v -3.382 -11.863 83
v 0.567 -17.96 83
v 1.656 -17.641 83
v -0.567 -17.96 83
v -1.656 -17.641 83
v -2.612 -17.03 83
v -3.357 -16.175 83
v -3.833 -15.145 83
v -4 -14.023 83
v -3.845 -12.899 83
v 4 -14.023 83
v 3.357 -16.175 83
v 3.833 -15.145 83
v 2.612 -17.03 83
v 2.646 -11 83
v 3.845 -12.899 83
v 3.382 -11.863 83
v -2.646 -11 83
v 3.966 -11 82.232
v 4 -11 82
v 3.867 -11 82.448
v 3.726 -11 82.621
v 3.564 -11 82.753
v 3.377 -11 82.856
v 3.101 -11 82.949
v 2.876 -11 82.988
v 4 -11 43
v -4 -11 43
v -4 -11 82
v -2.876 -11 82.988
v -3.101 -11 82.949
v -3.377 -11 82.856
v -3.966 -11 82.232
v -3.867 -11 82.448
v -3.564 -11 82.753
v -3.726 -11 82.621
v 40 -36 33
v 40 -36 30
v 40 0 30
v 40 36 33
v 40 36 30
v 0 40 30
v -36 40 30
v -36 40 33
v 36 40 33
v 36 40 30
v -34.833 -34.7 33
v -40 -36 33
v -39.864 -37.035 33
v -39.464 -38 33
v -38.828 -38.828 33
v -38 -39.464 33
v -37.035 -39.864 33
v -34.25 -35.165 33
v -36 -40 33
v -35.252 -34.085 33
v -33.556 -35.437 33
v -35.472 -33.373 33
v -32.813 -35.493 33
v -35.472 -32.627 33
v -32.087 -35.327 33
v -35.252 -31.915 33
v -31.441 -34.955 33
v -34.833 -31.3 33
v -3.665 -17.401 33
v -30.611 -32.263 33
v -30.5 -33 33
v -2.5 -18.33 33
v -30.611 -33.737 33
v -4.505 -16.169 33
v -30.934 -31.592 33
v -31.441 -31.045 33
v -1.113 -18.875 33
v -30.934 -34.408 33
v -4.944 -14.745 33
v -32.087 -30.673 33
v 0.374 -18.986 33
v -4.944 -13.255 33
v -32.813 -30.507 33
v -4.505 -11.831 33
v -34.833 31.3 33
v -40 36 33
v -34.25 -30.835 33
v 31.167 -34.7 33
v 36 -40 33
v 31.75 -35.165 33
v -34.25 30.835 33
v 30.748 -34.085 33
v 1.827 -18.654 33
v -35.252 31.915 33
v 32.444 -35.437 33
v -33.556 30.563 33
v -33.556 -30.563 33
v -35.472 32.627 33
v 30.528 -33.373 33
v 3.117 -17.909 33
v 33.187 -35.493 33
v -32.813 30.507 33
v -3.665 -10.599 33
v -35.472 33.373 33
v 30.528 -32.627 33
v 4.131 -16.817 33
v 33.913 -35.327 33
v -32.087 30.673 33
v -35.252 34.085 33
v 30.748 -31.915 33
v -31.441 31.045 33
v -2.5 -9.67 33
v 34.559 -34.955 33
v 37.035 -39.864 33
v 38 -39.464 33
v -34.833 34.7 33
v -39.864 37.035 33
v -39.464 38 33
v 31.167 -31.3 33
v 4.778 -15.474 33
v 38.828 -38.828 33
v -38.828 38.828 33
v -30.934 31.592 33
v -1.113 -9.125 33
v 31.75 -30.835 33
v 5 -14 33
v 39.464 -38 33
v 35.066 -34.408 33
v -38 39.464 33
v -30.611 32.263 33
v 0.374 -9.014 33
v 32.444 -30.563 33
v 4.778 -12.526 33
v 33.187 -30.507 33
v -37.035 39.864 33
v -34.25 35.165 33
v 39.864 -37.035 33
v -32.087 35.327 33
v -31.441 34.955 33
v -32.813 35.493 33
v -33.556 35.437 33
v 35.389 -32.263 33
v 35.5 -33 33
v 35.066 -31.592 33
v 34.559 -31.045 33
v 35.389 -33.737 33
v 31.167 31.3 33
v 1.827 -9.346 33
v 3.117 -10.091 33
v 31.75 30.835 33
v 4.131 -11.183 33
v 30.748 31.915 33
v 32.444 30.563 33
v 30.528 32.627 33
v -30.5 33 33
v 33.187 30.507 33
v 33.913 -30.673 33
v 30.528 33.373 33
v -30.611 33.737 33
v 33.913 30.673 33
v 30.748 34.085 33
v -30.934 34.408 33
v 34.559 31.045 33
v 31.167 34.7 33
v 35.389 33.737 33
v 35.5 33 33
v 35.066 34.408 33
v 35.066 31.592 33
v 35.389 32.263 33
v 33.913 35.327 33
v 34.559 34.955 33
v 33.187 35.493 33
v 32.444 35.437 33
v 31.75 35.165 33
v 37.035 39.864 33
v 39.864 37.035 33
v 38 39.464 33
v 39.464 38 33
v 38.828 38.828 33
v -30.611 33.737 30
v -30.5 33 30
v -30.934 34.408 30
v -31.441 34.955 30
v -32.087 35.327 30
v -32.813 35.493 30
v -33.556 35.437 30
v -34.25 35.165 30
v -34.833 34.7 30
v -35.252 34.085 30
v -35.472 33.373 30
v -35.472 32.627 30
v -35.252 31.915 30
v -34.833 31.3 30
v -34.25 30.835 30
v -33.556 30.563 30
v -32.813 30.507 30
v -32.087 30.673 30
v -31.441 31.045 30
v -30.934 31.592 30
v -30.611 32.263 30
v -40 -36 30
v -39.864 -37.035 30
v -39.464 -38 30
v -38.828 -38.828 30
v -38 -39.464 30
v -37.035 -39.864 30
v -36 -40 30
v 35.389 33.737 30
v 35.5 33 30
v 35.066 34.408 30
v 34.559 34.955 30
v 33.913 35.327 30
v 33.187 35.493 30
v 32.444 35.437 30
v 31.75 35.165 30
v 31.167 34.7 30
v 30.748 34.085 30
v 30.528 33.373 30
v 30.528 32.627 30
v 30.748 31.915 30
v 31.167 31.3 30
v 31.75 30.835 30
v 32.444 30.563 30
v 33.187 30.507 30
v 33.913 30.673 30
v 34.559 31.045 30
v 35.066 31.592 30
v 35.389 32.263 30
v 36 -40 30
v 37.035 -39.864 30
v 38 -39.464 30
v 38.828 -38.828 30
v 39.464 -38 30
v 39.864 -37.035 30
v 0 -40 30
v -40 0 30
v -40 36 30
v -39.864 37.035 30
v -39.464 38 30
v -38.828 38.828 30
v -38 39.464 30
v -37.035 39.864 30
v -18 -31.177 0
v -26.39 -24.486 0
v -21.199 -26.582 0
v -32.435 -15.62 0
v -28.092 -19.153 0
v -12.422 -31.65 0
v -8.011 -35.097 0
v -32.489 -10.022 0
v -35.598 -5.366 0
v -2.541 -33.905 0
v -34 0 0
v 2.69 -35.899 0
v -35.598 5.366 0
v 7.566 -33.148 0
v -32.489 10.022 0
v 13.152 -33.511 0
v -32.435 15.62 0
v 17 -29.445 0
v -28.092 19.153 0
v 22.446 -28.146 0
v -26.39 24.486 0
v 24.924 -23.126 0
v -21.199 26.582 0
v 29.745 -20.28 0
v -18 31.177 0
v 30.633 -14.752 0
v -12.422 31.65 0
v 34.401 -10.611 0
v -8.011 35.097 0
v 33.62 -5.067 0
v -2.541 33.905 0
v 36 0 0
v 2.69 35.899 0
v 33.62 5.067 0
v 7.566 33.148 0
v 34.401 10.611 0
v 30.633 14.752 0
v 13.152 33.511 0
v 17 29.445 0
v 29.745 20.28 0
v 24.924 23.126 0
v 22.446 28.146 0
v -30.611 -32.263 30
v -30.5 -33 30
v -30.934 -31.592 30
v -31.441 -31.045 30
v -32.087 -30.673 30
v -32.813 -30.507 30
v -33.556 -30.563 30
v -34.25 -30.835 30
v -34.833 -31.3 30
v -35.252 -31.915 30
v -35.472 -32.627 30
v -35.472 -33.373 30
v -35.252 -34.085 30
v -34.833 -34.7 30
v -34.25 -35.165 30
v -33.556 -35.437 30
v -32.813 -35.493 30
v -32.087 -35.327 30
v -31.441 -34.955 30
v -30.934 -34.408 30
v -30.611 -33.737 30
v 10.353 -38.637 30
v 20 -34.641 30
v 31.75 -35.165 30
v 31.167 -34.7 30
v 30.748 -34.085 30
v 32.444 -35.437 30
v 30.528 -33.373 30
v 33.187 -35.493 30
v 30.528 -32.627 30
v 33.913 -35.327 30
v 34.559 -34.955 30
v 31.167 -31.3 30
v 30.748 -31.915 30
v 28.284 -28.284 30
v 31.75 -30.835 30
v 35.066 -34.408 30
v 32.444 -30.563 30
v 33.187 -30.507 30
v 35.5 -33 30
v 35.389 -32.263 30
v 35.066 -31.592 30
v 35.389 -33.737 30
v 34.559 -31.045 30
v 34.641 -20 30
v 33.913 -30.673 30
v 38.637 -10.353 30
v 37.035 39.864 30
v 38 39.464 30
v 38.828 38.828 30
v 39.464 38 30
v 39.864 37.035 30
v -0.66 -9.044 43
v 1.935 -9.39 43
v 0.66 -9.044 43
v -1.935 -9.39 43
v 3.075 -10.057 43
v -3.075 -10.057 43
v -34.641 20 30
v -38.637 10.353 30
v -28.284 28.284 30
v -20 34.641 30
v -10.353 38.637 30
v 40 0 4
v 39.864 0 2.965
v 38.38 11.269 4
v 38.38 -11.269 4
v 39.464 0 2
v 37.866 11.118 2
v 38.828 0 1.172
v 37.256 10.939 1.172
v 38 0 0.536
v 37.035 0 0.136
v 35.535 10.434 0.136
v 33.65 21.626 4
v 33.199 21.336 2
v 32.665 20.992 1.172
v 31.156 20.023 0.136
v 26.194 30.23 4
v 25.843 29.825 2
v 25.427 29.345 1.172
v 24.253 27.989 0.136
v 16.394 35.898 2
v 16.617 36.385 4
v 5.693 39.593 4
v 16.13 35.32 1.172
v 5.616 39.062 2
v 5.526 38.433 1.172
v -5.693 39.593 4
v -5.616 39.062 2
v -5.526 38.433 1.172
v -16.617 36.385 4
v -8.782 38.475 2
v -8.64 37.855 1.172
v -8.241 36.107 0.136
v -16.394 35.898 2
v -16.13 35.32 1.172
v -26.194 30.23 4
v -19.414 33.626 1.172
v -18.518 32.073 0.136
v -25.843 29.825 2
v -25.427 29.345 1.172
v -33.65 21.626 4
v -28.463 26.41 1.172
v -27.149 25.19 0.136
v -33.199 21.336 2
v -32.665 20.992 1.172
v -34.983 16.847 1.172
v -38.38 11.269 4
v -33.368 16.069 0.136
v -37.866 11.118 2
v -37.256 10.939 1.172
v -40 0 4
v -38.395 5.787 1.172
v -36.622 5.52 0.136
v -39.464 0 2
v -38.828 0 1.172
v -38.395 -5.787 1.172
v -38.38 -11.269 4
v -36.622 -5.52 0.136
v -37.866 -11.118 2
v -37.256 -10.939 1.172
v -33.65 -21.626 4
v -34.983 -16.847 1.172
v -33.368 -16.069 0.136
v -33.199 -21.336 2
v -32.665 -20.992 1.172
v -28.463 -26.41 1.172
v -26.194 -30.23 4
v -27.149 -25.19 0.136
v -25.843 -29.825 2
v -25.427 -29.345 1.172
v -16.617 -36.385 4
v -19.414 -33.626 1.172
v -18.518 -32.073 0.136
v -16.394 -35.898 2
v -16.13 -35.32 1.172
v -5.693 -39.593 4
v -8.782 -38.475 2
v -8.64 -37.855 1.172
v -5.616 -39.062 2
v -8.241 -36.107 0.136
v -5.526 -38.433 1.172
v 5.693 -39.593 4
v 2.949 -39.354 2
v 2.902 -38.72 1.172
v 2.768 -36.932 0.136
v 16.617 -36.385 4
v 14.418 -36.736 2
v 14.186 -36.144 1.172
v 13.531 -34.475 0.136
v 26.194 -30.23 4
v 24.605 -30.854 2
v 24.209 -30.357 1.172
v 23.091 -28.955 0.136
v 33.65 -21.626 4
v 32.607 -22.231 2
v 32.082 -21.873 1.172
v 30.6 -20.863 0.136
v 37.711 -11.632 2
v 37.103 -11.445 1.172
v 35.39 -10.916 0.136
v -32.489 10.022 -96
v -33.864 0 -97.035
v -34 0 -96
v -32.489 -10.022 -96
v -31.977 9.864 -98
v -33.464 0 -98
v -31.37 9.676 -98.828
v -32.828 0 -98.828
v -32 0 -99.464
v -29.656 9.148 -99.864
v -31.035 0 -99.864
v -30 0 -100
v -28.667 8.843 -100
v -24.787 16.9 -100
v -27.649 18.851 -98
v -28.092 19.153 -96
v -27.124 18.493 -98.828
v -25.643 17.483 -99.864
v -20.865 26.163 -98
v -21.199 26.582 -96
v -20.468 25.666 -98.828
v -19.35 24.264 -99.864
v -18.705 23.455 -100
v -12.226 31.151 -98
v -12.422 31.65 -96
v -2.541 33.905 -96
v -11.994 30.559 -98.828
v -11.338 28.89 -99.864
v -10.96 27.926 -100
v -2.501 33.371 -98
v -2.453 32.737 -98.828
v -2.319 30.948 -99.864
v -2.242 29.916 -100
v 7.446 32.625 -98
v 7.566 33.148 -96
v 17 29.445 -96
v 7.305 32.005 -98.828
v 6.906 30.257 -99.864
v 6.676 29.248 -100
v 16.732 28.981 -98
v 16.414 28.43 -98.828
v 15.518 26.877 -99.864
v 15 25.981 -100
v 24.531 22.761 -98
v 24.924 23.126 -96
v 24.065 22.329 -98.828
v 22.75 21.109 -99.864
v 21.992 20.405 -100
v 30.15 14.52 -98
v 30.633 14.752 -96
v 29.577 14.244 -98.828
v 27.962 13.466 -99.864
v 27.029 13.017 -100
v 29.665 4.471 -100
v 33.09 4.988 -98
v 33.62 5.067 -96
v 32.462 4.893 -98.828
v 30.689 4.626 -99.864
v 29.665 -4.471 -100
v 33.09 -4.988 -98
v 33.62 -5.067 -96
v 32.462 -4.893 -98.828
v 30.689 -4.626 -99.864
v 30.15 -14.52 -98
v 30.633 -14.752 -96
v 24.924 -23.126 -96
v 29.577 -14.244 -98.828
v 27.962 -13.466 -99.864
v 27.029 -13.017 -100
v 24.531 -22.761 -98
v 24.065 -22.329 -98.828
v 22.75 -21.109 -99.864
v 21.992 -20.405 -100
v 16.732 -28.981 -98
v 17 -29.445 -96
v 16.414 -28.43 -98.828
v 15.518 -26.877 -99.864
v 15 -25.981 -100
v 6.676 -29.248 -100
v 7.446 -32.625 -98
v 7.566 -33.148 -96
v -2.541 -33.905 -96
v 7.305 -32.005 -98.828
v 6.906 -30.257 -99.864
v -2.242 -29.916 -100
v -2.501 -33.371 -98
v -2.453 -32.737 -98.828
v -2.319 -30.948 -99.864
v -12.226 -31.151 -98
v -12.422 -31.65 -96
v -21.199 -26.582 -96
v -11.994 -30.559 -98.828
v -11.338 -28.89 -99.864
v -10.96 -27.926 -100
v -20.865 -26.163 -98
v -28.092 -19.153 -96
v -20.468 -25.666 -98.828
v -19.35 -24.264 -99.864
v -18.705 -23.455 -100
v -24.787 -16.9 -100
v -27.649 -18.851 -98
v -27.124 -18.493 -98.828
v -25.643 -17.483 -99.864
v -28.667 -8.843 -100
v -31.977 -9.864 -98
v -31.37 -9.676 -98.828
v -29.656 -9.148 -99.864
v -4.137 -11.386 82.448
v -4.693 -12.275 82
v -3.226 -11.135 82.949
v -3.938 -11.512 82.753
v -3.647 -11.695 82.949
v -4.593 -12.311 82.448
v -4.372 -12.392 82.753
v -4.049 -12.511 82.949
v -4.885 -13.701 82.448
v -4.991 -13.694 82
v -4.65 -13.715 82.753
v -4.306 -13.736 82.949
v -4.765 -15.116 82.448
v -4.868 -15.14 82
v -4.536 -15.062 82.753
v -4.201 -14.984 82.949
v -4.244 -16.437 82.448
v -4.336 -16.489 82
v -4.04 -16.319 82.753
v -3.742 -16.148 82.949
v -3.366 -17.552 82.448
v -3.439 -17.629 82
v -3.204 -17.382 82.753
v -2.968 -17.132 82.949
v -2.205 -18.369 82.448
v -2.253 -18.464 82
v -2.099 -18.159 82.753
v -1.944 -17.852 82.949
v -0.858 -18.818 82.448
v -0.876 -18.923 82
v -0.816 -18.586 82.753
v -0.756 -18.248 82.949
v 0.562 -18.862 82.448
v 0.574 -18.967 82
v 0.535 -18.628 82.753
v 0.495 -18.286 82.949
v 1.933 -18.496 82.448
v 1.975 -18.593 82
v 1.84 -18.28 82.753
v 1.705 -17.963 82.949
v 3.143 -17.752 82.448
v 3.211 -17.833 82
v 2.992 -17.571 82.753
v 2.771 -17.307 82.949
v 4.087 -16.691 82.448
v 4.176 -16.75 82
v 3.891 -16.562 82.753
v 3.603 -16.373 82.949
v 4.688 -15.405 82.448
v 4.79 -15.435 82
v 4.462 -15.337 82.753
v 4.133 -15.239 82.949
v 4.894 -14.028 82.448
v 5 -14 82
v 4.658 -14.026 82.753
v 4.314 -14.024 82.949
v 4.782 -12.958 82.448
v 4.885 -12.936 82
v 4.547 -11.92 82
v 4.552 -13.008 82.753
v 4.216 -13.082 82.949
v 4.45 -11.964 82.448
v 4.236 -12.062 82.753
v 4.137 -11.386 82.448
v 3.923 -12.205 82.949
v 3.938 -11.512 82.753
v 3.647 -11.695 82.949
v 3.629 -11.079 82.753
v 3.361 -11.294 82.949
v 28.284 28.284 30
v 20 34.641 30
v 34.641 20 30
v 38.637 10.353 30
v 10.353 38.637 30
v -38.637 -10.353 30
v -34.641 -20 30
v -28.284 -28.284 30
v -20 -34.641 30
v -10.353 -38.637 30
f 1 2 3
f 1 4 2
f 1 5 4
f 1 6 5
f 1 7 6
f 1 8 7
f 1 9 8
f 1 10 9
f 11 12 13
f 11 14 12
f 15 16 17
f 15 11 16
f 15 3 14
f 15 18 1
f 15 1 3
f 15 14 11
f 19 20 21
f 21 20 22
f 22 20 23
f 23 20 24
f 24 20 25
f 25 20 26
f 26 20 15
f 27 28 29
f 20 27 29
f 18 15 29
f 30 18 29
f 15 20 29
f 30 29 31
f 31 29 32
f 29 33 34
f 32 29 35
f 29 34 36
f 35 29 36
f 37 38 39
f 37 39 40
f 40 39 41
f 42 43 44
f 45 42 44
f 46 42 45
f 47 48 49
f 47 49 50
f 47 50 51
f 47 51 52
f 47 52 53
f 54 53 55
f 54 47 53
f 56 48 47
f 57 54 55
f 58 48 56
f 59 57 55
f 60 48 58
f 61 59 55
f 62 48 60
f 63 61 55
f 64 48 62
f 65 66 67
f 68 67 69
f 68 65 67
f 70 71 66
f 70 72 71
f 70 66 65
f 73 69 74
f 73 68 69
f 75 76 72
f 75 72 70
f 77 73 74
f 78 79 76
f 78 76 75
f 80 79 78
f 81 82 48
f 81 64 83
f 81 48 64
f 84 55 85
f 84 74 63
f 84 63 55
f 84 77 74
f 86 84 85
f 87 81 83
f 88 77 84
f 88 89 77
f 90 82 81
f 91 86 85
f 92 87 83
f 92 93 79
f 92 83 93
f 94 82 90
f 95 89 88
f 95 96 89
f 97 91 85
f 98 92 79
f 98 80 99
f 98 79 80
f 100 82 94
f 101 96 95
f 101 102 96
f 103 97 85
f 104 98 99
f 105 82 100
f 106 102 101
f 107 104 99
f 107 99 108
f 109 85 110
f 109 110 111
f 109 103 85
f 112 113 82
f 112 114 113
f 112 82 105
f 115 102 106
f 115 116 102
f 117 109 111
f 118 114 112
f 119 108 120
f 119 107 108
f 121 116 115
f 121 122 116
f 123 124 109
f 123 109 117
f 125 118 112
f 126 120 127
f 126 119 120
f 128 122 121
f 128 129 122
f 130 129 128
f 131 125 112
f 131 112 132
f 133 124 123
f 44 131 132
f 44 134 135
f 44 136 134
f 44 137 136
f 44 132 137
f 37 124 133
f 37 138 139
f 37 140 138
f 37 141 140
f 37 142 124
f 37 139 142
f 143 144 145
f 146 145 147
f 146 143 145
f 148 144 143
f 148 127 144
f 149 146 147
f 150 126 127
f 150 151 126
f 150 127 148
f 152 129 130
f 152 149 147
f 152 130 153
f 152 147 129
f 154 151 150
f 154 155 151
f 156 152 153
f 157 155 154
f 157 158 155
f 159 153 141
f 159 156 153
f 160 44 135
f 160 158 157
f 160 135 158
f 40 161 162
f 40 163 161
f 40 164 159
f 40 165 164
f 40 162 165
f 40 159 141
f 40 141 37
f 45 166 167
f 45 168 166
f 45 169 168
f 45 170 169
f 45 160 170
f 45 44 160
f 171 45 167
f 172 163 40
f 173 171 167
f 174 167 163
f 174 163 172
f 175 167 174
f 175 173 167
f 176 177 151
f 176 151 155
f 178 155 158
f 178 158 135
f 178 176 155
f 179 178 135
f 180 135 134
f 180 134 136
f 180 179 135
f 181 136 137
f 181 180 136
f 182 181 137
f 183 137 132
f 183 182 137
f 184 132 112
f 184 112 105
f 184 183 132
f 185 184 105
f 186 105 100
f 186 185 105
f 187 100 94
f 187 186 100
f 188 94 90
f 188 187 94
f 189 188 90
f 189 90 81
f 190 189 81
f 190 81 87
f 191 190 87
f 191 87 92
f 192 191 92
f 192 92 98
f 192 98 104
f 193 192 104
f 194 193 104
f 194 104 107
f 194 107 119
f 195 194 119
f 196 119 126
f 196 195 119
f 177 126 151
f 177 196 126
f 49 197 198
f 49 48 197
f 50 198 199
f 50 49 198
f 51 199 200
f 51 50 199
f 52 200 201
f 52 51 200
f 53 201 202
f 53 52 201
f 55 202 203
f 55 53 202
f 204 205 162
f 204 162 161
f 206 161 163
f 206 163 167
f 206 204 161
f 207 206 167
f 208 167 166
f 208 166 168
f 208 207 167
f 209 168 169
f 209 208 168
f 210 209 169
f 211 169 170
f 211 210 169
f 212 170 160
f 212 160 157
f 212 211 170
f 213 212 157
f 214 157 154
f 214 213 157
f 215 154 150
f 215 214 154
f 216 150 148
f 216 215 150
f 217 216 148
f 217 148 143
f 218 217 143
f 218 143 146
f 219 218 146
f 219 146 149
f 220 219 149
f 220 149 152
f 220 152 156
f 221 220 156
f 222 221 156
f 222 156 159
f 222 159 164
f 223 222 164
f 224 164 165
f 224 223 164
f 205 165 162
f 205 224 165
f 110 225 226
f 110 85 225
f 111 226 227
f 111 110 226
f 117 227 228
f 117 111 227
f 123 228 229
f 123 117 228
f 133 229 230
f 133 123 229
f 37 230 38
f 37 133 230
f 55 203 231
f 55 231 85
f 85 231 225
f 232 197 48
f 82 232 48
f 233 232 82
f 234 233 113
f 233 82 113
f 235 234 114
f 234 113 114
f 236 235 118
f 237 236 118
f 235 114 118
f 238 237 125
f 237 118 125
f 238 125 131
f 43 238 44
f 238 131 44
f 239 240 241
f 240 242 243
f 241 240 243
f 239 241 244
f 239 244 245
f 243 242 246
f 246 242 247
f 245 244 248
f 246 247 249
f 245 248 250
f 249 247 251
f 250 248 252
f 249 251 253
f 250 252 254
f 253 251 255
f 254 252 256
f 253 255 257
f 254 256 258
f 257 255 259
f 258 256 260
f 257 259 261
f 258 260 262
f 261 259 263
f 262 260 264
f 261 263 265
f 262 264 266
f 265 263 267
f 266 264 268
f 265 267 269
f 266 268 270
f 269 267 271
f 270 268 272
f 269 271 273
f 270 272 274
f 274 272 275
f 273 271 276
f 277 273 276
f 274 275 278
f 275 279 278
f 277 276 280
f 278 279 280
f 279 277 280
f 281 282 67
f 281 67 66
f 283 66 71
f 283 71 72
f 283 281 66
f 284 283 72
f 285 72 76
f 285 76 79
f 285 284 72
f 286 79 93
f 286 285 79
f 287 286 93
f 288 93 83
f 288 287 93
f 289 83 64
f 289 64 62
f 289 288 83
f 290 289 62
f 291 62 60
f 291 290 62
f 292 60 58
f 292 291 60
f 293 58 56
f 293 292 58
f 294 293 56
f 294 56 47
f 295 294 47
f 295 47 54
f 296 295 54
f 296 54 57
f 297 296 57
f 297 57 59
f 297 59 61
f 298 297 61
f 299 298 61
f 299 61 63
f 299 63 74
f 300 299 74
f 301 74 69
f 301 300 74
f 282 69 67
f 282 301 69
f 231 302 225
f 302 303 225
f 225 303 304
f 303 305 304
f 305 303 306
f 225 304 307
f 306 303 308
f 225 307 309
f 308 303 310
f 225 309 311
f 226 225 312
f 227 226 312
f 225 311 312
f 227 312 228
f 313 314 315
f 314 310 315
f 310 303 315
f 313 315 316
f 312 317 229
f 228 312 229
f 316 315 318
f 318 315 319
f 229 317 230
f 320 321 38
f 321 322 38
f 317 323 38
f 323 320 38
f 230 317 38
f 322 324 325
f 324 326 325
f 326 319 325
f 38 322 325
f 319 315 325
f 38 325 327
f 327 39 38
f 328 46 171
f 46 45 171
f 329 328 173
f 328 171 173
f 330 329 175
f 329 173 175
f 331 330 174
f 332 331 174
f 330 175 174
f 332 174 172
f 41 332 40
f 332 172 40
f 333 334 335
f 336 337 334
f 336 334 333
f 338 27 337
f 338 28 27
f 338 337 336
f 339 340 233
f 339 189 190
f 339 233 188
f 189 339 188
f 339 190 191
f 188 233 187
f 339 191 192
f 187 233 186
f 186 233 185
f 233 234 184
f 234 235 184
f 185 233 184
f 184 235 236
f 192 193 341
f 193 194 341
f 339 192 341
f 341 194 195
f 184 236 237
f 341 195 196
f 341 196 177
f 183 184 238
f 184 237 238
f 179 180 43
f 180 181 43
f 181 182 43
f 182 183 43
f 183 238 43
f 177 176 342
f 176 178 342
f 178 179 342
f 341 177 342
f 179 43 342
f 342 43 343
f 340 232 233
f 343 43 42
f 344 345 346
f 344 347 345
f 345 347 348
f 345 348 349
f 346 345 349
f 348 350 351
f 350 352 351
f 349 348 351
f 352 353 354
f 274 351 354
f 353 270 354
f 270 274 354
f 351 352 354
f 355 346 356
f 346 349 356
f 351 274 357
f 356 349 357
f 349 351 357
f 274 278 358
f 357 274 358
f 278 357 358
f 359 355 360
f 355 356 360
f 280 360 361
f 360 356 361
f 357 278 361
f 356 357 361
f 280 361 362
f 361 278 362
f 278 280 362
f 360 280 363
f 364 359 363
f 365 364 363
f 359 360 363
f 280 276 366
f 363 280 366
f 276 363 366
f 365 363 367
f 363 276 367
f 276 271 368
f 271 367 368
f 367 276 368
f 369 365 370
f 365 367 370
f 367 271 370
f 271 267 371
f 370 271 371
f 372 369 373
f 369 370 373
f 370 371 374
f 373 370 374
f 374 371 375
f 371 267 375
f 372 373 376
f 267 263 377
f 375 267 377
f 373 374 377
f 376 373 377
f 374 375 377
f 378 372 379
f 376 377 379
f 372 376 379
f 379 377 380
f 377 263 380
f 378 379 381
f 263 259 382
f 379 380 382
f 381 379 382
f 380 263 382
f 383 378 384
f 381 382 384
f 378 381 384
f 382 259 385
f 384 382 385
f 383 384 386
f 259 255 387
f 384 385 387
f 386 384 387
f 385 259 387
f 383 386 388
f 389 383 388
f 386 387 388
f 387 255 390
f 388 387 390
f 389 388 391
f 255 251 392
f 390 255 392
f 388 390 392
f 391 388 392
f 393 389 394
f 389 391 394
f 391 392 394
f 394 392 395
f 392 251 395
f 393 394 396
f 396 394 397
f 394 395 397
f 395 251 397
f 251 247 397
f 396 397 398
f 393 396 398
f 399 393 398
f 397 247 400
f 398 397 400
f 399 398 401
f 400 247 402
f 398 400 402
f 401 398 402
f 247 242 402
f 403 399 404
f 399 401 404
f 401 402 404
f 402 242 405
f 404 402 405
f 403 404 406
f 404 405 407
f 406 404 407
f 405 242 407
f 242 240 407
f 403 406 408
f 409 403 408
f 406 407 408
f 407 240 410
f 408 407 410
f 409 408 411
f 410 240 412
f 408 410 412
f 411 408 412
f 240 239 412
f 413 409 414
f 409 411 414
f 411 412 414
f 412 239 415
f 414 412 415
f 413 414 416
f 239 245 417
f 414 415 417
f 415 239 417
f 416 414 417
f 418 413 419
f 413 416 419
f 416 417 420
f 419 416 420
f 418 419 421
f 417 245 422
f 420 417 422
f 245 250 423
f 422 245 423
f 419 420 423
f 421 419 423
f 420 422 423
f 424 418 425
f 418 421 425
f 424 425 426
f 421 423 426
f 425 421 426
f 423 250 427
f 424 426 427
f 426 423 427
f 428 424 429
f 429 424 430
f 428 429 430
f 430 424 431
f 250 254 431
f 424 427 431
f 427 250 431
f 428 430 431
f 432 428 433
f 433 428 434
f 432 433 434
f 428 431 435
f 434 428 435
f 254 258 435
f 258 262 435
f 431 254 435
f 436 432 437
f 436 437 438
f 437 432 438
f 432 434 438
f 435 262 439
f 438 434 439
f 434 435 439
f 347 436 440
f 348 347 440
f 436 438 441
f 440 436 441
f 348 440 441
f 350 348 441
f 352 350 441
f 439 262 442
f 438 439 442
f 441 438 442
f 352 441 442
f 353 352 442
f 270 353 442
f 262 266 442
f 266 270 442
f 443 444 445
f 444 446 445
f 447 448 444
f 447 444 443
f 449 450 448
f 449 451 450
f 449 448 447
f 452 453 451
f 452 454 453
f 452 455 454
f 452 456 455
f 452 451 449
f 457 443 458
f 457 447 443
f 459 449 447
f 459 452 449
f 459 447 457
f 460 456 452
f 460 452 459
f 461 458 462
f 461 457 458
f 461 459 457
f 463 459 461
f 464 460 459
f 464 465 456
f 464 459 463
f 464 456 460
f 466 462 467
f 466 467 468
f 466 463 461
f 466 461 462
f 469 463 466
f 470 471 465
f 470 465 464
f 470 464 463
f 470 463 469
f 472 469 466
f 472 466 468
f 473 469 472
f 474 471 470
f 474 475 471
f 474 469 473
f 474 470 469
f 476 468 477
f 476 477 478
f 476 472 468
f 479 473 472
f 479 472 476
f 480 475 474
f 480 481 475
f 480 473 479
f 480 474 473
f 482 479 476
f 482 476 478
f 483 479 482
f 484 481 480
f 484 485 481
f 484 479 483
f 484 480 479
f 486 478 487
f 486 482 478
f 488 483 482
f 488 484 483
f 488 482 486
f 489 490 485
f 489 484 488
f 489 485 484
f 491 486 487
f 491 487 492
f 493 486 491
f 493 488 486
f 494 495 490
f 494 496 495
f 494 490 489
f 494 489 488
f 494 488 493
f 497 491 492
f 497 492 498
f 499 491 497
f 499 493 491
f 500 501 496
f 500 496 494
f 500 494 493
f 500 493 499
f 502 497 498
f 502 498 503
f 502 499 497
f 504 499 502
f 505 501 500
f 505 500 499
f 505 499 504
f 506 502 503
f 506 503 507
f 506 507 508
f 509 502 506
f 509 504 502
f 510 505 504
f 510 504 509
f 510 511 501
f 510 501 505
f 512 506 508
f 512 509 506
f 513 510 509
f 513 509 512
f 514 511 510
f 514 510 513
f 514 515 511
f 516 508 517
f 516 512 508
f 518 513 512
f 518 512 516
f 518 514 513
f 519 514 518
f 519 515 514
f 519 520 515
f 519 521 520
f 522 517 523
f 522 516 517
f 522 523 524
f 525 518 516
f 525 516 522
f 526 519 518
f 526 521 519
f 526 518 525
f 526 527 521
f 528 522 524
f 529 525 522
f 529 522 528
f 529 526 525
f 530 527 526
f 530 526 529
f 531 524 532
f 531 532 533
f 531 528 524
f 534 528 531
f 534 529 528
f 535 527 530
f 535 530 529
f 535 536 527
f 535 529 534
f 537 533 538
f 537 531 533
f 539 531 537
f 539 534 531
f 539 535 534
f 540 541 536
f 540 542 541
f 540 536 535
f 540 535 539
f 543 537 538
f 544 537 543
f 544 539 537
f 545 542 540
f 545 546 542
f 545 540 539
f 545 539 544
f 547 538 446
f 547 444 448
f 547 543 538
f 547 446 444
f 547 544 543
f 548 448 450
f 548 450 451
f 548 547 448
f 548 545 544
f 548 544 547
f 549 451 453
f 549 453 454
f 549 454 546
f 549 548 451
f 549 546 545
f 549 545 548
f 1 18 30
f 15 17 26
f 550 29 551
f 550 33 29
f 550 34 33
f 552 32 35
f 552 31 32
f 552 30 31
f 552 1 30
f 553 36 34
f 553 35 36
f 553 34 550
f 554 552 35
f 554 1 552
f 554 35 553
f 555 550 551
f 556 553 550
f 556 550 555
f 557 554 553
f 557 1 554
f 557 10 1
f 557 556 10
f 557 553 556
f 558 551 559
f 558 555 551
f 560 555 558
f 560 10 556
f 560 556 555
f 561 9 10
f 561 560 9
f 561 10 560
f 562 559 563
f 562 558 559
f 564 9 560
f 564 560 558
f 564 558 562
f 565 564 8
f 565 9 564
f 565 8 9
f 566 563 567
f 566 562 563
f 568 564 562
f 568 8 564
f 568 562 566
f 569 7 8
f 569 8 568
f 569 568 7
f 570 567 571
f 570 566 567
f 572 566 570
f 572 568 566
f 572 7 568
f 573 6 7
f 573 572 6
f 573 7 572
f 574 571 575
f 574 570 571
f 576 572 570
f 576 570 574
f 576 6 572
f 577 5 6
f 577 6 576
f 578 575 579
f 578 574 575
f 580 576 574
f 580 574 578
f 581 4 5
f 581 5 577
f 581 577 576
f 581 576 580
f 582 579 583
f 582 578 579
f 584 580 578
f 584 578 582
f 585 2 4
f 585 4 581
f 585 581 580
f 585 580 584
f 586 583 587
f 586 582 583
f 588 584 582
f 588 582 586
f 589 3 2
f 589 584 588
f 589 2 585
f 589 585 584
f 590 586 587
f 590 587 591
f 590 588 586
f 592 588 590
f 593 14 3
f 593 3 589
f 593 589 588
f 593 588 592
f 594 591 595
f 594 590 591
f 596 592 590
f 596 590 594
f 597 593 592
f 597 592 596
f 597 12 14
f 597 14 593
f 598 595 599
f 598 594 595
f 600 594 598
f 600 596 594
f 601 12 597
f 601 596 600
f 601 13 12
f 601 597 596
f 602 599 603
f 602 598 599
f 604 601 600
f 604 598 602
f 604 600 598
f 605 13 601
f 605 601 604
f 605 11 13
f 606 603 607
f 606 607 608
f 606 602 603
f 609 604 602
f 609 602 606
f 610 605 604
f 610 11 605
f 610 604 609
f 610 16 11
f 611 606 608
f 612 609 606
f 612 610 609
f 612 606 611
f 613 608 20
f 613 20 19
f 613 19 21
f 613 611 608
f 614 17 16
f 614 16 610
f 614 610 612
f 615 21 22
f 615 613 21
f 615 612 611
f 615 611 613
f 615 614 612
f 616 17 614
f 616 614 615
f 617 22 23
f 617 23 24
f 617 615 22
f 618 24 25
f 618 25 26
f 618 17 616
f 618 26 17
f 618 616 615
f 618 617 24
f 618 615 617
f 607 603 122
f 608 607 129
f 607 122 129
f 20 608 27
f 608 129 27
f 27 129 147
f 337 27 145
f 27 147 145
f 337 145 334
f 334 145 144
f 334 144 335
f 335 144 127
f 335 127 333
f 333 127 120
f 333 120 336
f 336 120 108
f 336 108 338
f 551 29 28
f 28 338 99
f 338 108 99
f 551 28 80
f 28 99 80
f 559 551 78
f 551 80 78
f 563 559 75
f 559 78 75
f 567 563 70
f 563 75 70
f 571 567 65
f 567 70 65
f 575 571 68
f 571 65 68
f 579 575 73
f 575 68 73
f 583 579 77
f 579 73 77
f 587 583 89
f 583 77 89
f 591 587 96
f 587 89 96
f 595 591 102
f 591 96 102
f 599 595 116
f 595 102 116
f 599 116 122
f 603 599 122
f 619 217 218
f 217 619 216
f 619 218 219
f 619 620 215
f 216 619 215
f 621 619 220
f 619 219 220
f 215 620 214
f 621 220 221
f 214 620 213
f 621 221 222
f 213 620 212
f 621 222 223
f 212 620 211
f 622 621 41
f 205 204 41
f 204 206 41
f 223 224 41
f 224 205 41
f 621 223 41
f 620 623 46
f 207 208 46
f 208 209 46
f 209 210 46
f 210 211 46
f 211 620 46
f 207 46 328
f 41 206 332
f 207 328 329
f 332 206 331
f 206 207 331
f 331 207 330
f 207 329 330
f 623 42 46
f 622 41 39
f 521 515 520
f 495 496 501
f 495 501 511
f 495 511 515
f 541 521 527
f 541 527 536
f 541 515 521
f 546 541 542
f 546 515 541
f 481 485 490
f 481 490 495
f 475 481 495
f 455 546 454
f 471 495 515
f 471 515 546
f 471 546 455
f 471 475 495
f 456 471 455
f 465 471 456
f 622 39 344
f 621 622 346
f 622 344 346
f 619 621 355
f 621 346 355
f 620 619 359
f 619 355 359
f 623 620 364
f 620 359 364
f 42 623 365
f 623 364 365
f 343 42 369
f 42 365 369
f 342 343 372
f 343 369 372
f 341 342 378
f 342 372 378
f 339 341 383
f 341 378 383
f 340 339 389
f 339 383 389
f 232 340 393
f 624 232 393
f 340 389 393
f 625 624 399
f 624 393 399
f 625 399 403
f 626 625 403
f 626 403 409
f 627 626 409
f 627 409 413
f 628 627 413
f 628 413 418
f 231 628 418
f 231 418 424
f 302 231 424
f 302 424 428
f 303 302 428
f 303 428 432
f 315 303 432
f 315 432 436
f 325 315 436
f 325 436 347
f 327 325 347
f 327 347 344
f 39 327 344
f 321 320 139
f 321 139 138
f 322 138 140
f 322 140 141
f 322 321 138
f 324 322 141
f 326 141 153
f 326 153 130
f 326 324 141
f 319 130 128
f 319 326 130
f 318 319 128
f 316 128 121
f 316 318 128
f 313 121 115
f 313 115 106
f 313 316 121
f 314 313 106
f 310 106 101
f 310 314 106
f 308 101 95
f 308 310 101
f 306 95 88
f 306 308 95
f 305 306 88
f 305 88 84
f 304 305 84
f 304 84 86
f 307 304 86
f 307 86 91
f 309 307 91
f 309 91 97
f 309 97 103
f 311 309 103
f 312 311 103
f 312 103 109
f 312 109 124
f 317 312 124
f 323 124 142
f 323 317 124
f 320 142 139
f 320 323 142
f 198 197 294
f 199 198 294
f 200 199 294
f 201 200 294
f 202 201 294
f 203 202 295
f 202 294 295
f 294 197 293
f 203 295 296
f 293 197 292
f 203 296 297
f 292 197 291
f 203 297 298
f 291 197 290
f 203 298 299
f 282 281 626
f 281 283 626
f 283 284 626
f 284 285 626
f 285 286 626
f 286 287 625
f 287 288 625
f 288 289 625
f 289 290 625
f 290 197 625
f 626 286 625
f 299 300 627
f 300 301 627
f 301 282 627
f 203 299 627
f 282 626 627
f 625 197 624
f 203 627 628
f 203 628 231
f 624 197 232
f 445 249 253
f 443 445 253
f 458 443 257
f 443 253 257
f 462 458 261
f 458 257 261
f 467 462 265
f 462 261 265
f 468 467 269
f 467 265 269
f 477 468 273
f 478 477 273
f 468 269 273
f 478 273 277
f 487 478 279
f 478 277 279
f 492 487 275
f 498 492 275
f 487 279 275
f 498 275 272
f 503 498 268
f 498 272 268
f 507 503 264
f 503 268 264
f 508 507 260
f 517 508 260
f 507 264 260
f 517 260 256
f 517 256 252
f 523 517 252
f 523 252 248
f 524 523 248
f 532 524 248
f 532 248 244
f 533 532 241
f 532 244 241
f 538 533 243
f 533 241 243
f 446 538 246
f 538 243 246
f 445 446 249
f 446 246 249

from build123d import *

# Parameters (mm, degrees)
SKETCH1_R           = 40
BOSS_EXTRUDE1_DEPTH = 30
SKETCH2_W           = 80
SKETCH2_H           = 80
SKETCH2_R           = 2.5
BOSS_EXTRUDE2_DEPTH = 3
FILLET1_R           = 4
SKETCH3_R           = 34
BOSS_EXTRUDE3_DEPTH = 100
FILLET2_R           = 4
SKETCH4_R           = 5
BOSS_EXTRUDE4_DEPTH = 50
FILLET3_R           = 1
SKETCH5_W           = 42.68943546
SKETCH5_H           = 2
CUT_EXTRUDE1_DEPTH  = 81


with BuildPart() as part:
    # Sketch1 → Boss-Extrude1 (new body)
    with BuildSketch(Plane.XY):
        Circle(SKETCH1_R)
    extrude(amount=BOSS_EXTRUDE1_DEPTH)

    # Sketch2 → Boss-Extrude2 (add)
    with BuildSketch(Plane.XY.offset(30)):
        Rectangle(SKETCH2_W, SKETCH2_H)
        with Locations((33, -33)):
            Circle(SKETCH2_R, mode=Mode.SUBTRACT)
        with Locations((-33, 33)):
            Circle(SKETCH2_R, mode=Mode.SUBTRACT)
        with Locations((33, 33)):
            Circle(SKETCH2_R, mode=Mode.SUBTRACT)
        with Locations((-33, -33)):
            Circle(SKETCH2_R, mode=Mode.SUBTRACT)
    extrude(amount=BOSS_EXTRUDE2_DEPTH)

    # Fillet1
    fillet1_edges = [part.edges().sort_by_distance(p)[0] for p in [
        (40, 40, 31.5),
        (-40, 40, 31.5),
        (-40, -40, 31.5),
        (40, -40, 31.5),
    ]]
    fillet(fillet1_edges, radius=FILLET1_R)

    # Sketch3 → Boss-Extrude3 (add)
    with BuildSketch(Plane(origin=(0, 0, 0), x_dir=(-1, 0, 0), z_dir=(0, 0, -1))):
        Circle(SKETCH3_R)
    extrude(amount=BOSS_EXTRUDE3_DEPTH)

    # Fillet2
    fillet2_edges = [part.edges().sort_by_distance(p)[0] for p in [
        (-40, 0, 0),
        (34, 0, -100),
    ]]
    fillet(fillet2_edges, radius=FILLET2_R)

    # Sketch4 → Boss-Extrude4 (add)
    with BuildSketch(Plane.XY.offset(33)):
        with Locations((0, -14)):
            Circle(SKETCH4_R)
    extrude(amount=BOSS_EXTRUDE4_DEPTH)

    # Fillet3
    fillet3_edges = [part.edges().sort_by_distance(p)[0] for p in [
        (-5, -14, 83),
    ]]
    fillet(fillet3_edges, radius=FILLET3_R)

    # Sketch5 → Cut-Extrude1 (cut, through all)
    with BuildSketch(Plane.ZY.offset(40)):
        with Locations((64.34471773, -10)):
            Rectangle(SKETCH5_W, SKETCH5_H)
    extrude(amount=-CUT_EXTRUDE1_DEPTH, mode=Mode.SUBTRACT)


solid = part.part
